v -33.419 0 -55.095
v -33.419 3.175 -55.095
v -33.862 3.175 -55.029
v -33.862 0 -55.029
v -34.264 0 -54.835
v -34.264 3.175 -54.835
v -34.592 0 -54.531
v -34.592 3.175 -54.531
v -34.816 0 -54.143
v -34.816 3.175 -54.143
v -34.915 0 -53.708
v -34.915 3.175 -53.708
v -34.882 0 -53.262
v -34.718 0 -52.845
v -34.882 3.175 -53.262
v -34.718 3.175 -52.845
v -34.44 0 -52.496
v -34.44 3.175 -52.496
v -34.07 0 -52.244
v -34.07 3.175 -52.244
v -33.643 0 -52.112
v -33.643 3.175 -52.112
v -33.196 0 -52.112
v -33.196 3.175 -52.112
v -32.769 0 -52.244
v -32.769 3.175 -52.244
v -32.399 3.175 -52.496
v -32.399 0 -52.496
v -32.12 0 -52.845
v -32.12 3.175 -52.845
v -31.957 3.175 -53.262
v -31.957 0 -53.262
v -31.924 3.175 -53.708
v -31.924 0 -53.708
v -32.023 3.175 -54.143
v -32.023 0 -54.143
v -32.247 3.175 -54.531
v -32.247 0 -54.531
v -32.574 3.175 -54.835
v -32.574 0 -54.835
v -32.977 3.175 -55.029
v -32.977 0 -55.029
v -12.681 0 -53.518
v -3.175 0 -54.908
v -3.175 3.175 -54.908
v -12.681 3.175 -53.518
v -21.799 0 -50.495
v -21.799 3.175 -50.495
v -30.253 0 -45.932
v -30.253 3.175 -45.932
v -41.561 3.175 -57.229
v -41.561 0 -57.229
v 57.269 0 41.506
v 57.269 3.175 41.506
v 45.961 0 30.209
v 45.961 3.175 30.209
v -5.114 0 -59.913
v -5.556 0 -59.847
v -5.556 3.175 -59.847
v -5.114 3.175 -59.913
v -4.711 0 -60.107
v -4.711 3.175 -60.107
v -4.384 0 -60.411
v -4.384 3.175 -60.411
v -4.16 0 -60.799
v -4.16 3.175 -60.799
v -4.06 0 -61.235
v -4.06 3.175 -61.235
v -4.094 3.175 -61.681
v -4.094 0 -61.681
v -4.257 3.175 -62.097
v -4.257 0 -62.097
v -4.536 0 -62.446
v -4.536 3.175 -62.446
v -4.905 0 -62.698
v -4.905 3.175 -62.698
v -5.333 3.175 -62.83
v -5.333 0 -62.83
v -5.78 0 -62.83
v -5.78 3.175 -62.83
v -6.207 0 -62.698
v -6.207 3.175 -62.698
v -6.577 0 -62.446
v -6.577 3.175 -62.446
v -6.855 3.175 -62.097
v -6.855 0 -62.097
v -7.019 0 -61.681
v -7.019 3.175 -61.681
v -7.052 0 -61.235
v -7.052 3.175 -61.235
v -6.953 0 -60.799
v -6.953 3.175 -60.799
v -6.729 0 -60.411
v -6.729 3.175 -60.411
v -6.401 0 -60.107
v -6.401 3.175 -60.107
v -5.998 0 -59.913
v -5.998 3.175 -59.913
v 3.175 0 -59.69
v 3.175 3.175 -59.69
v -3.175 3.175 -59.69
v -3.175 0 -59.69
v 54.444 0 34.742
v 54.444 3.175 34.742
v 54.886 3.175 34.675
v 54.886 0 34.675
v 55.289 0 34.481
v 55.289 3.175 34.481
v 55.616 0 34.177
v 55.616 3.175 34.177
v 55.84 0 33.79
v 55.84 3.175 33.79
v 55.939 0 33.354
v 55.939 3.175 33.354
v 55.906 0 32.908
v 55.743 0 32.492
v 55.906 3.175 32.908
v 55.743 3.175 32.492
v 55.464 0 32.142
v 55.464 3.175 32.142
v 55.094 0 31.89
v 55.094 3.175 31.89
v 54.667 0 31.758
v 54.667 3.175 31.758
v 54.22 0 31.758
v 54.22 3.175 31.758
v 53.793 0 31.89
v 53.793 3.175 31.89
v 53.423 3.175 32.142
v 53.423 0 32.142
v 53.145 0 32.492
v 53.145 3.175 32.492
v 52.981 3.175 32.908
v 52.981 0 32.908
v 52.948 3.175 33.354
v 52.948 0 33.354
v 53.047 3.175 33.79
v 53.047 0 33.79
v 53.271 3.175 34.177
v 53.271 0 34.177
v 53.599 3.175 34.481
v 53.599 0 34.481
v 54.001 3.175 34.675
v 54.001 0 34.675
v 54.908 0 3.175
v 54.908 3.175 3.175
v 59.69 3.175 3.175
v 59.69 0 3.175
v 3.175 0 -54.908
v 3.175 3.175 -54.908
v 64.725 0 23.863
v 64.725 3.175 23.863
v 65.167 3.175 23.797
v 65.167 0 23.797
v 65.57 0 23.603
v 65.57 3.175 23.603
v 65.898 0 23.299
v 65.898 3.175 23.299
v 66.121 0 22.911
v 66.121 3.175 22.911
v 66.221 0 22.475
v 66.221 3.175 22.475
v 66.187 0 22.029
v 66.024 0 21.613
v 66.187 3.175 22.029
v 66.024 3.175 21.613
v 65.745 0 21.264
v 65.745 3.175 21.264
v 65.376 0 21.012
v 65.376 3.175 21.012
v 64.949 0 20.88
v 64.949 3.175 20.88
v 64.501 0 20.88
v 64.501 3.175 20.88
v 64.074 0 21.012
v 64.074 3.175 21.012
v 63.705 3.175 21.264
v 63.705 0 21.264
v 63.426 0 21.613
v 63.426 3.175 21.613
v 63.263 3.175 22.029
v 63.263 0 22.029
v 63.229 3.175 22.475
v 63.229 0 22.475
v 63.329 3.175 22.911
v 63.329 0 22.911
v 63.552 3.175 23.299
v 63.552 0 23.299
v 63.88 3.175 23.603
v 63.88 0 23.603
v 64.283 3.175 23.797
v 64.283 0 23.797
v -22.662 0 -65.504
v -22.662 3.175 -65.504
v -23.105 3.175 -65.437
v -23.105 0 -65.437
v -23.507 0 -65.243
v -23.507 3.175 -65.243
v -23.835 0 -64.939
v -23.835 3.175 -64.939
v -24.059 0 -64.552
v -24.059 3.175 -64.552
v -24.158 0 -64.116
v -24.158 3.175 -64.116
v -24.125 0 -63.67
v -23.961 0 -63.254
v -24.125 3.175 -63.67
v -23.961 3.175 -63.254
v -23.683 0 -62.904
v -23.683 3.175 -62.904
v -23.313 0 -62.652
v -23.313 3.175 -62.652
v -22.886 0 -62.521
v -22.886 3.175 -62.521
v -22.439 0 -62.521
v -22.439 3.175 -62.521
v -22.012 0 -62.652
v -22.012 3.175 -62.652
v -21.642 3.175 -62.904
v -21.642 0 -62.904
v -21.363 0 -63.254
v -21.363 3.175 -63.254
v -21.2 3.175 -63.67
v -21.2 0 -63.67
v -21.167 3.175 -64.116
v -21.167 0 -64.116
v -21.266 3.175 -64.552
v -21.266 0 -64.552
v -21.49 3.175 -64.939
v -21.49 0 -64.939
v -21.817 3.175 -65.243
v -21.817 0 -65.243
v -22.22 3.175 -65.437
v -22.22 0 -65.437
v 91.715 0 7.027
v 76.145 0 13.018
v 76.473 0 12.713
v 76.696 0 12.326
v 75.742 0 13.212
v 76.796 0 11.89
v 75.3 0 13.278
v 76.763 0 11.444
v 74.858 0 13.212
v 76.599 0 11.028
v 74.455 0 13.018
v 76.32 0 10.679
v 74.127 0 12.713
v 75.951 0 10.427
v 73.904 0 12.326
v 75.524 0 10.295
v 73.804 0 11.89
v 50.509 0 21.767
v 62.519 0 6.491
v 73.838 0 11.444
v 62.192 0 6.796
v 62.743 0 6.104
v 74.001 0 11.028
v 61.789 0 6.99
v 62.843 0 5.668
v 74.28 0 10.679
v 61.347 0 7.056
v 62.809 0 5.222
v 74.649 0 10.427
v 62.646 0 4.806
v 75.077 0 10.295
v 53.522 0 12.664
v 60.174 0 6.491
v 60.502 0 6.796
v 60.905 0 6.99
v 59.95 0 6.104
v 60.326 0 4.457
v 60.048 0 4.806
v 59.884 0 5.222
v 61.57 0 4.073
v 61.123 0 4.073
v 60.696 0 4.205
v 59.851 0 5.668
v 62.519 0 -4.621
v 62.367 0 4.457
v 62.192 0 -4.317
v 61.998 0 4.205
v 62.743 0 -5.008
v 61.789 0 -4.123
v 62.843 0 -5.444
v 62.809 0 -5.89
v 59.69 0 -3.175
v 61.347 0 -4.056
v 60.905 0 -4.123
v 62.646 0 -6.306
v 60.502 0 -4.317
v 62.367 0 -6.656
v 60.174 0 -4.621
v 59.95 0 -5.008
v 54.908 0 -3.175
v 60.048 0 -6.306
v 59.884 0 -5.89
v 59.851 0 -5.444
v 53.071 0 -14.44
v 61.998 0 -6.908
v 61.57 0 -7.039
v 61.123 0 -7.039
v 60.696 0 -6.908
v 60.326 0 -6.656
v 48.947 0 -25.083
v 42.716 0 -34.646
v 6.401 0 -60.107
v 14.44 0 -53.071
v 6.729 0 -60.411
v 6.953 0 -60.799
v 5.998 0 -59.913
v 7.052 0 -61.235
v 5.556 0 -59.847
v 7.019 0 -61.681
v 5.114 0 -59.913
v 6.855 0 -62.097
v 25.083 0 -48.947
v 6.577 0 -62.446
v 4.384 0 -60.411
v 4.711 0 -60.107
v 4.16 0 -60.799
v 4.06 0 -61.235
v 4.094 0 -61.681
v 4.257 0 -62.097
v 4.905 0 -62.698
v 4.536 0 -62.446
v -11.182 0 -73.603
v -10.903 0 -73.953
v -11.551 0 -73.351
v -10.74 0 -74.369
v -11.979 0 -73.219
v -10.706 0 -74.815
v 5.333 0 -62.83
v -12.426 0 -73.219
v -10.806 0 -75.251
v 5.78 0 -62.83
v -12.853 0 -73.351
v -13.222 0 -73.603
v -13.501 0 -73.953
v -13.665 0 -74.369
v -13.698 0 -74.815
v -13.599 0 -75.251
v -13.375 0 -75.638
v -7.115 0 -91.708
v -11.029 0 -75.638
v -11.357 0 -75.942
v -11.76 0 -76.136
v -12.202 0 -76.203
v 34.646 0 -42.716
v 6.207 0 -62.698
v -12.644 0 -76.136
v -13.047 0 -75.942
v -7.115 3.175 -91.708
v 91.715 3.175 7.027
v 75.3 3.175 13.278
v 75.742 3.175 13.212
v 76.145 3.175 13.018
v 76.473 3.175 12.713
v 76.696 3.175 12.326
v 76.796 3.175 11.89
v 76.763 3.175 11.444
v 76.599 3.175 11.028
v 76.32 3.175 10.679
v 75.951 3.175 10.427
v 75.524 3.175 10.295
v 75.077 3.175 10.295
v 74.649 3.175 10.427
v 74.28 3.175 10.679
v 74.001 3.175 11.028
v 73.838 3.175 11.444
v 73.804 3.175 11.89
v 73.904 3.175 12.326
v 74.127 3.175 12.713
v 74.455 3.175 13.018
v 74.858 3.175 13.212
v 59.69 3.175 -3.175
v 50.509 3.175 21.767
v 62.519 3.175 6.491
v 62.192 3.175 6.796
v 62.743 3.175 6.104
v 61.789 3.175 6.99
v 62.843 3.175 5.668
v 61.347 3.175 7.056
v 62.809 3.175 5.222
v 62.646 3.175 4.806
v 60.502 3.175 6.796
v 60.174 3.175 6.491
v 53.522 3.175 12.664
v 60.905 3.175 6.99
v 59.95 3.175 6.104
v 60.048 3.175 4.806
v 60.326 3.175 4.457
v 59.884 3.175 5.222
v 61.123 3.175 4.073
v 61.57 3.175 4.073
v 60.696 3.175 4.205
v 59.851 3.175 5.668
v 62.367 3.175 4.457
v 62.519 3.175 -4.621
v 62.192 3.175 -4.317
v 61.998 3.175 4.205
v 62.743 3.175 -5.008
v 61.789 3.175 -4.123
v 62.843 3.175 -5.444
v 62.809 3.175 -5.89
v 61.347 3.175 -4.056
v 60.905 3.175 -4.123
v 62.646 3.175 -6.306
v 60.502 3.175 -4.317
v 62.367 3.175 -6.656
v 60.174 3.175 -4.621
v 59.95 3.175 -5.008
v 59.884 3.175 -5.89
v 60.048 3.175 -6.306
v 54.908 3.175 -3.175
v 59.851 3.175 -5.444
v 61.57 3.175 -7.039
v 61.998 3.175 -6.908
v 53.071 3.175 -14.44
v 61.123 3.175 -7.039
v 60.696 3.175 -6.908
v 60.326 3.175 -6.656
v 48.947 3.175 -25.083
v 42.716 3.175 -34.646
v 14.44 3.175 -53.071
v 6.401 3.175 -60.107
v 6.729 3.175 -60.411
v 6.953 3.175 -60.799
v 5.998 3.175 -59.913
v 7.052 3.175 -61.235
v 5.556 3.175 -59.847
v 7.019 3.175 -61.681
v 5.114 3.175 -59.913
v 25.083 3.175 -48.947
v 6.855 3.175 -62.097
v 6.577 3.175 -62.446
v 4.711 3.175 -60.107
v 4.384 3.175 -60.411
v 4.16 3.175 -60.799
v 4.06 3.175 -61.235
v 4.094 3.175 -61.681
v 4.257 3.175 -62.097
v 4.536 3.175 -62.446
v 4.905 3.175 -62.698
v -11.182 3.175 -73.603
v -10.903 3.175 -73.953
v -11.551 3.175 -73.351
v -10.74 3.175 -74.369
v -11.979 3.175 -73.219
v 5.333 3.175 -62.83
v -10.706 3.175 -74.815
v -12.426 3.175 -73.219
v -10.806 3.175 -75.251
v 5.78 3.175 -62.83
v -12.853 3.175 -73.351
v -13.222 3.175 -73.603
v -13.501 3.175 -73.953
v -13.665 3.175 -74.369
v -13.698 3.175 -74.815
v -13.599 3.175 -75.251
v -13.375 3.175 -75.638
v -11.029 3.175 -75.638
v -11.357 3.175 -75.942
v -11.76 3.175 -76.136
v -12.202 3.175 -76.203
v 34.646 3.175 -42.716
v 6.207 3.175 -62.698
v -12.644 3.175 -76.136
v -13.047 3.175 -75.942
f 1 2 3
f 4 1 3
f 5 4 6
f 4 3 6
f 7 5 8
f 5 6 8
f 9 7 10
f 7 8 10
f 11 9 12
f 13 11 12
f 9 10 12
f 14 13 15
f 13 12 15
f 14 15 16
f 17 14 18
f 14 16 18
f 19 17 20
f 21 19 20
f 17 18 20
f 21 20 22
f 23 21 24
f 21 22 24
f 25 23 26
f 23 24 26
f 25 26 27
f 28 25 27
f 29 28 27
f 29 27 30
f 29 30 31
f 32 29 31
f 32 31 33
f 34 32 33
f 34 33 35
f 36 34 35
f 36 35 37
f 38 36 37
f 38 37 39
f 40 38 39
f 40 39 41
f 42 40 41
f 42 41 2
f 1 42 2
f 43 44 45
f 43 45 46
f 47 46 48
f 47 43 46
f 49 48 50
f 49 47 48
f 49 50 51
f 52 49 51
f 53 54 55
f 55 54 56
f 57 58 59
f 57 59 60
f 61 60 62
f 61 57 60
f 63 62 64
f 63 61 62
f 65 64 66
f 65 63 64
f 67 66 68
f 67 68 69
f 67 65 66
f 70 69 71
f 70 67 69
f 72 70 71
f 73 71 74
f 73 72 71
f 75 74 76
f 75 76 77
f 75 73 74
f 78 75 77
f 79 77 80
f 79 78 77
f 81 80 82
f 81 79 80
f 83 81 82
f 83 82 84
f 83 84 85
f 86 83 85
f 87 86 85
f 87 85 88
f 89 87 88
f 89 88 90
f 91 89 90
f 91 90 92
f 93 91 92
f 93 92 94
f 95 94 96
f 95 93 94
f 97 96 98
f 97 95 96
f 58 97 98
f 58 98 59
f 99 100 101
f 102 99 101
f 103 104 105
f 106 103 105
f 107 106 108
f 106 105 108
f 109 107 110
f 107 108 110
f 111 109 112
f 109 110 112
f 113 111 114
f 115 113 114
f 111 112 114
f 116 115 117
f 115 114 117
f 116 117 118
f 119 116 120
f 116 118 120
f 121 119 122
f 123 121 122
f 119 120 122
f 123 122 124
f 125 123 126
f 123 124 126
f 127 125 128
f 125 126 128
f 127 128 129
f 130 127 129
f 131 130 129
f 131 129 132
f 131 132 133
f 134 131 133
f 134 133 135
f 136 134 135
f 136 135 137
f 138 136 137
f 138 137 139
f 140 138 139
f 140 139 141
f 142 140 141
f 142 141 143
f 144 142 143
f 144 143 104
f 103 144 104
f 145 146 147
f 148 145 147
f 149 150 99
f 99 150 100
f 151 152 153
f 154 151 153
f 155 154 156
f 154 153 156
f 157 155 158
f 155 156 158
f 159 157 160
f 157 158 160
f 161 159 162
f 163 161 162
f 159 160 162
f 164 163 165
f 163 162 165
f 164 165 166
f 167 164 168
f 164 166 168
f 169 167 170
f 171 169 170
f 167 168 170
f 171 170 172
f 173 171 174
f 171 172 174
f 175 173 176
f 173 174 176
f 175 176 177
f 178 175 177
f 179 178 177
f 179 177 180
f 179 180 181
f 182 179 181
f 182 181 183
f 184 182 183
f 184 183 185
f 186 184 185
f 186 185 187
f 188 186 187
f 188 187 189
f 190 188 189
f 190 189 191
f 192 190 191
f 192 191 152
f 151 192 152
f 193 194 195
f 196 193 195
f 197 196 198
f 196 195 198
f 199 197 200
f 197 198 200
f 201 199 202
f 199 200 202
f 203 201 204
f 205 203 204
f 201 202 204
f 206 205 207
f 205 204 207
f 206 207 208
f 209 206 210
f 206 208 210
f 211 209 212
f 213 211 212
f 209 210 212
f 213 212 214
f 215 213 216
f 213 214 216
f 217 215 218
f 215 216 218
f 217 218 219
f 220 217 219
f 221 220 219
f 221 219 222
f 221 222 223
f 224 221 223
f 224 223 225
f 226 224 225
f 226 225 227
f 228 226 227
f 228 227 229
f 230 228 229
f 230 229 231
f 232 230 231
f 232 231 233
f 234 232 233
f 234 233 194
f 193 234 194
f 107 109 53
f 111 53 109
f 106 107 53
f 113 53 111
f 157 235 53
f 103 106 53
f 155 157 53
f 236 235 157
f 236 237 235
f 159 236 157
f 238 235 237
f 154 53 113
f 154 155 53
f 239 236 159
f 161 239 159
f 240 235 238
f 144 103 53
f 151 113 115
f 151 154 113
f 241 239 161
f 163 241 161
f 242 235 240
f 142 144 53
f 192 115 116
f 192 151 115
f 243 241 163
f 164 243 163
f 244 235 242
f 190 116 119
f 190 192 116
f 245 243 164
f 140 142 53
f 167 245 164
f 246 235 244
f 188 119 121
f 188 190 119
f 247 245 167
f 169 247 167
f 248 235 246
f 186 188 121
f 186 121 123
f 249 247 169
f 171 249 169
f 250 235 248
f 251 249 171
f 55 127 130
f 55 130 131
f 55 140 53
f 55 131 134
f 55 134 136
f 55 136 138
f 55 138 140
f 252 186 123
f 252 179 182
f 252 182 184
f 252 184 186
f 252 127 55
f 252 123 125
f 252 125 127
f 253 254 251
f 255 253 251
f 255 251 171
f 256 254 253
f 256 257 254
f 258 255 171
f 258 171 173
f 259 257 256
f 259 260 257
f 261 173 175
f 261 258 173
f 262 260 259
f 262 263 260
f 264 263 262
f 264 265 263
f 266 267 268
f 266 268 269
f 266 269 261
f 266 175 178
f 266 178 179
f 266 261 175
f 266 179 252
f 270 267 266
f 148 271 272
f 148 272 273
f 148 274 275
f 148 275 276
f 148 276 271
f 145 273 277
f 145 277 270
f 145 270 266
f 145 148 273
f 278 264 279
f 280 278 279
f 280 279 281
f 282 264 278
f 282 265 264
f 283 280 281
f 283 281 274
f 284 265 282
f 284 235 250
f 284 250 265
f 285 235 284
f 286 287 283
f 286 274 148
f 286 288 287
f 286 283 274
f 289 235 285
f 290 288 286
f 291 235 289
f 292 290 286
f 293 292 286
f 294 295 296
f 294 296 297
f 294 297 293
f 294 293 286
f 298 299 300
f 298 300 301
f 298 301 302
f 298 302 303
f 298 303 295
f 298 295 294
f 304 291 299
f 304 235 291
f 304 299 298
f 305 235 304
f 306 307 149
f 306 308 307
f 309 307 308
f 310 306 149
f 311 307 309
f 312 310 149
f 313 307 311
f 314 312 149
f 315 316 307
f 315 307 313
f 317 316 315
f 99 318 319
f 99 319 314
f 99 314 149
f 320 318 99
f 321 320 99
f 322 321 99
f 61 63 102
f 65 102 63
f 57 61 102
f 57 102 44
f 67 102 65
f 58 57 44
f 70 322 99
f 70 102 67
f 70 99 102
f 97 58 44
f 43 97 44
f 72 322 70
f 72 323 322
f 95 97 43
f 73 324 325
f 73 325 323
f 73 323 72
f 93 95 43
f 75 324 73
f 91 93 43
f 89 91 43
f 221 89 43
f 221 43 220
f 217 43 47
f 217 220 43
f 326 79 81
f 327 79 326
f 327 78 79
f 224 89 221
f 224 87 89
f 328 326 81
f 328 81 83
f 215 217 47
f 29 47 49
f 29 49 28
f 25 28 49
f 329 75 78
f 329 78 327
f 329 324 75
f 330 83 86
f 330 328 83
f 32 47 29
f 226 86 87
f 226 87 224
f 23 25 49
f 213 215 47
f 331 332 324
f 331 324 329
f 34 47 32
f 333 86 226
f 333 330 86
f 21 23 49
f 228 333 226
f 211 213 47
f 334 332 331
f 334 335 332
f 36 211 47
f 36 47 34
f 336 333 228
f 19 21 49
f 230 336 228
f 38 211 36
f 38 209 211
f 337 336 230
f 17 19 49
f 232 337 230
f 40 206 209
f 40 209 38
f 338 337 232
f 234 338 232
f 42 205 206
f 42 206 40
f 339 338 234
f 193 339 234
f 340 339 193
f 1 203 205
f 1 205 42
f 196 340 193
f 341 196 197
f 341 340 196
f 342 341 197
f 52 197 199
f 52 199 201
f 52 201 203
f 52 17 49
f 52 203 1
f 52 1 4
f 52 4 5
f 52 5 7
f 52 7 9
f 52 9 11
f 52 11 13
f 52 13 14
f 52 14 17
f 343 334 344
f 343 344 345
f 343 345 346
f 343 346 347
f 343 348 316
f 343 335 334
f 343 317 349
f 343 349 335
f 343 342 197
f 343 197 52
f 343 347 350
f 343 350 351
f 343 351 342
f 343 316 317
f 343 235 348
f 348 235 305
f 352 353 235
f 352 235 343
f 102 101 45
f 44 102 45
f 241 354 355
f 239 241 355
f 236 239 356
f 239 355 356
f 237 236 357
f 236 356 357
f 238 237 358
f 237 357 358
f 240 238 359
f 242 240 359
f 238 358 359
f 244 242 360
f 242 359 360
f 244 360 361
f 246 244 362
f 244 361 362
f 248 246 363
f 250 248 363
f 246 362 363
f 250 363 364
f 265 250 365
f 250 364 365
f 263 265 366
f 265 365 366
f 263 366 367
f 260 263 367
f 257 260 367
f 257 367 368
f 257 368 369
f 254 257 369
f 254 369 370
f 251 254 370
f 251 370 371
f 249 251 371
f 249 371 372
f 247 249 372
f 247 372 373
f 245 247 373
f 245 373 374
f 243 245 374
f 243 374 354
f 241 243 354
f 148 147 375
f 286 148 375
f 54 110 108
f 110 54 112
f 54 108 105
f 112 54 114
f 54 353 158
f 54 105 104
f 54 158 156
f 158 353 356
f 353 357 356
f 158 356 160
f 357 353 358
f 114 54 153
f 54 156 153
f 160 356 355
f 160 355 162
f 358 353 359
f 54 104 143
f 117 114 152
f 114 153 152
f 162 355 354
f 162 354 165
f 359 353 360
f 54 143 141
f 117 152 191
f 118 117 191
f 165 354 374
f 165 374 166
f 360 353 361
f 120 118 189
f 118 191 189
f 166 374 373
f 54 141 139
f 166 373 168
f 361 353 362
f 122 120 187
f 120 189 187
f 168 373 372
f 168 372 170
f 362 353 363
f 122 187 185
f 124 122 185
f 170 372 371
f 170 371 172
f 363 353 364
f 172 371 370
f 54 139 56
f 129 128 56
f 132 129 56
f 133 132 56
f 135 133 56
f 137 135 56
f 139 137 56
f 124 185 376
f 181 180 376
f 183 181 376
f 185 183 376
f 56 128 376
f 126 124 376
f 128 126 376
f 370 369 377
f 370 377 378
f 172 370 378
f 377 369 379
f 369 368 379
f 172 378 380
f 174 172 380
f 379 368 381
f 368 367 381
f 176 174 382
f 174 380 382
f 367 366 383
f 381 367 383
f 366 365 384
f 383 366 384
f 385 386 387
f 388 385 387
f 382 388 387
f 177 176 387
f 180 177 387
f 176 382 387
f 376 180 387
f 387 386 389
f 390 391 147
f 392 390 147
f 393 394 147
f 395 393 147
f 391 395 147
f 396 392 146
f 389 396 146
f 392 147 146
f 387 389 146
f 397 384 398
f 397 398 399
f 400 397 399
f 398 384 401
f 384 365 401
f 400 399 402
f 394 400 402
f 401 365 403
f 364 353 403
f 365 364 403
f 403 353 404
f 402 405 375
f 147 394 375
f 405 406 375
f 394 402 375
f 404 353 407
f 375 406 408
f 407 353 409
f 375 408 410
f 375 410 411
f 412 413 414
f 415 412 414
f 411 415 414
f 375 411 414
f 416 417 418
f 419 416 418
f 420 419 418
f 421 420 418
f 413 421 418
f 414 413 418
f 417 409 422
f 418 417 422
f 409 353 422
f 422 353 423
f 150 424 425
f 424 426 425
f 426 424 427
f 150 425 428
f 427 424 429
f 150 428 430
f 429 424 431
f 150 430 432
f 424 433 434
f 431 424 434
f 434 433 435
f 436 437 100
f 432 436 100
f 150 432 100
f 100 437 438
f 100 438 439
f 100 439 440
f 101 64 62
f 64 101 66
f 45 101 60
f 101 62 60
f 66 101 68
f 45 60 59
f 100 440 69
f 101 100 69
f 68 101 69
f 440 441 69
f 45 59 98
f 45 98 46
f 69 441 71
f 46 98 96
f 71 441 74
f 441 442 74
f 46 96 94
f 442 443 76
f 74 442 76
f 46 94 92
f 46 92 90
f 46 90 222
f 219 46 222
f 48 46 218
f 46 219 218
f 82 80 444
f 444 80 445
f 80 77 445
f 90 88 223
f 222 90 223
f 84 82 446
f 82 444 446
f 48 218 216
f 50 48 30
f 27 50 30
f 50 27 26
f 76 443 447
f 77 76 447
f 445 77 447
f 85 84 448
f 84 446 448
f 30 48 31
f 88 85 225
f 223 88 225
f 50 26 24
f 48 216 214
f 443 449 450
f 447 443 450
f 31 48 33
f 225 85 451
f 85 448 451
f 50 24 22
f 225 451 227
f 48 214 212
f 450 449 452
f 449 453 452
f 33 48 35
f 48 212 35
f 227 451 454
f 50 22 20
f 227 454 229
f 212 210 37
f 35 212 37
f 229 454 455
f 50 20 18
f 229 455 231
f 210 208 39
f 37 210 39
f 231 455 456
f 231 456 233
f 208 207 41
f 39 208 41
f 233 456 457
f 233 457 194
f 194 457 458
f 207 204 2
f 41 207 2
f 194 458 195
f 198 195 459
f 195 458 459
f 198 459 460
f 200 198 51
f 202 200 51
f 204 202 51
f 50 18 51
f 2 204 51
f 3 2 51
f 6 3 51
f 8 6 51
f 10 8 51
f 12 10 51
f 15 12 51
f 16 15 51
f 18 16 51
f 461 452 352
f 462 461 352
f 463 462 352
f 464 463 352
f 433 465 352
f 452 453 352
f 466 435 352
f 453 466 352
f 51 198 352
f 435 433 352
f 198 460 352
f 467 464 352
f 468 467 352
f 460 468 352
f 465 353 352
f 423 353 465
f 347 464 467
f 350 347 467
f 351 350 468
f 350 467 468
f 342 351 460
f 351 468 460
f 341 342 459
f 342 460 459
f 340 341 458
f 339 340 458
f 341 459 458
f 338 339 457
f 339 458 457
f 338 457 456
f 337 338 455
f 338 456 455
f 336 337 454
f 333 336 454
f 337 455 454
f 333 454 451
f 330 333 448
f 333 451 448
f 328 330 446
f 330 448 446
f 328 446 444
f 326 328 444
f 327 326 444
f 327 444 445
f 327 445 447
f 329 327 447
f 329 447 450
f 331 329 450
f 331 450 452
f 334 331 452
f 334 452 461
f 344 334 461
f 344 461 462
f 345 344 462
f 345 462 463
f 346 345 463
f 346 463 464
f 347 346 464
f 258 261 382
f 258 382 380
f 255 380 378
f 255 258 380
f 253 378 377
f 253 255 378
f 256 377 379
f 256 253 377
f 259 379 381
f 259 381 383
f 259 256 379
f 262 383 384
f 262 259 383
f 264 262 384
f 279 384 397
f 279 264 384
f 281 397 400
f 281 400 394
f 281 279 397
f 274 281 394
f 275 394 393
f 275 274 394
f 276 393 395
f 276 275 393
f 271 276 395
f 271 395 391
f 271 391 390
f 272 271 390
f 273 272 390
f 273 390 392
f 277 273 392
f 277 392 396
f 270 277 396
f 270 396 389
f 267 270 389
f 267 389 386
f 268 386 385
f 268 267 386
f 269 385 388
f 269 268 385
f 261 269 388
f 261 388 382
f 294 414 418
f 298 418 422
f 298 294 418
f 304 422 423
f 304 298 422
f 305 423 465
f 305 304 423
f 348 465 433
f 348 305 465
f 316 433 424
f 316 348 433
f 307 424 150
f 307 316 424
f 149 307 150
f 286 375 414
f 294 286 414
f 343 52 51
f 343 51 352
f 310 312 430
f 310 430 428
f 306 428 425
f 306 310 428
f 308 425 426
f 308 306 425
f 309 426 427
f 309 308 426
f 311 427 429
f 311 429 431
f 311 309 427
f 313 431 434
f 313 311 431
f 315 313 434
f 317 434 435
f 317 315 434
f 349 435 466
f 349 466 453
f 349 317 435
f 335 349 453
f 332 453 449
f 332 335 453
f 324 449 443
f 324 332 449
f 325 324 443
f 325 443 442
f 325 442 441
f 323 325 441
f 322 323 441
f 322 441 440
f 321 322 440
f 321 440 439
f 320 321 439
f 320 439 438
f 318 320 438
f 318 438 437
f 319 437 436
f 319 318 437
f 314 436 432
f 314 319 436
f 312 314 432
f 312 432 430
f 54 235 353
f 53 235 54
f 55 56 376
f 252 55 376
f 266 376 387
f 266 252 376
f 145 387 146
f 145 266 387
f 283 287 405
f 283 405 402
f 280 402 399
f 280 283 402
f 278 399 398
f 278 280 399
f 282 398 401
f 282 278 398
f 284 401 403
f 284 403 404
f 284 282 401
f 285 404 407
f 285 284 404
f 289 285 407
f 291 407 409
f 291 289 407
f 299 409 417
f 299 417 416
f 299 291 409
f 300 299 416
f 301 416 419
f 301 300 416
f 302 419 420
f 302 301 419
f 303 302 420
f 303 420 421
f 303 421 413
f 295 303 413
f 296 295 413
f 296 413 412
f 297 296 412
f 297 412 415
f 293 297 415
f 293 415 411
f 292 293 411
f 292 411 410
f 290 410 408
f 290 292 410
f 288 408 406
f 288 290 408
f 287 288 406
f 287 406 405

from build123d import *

# Parameters (mm, degrees)
SKETCH1_R           = 1.5
SKETCH1_R_2         = 55
BOSS_EXTRUDE1_DEPTH = 3.175
CUT_EXTRUDE3_DEPTH  = 140.736059076
CUT_EXTRUDE4_DEPTH  = 140.736059076
CUT_EXTRUDE5_DEPTH  = 140.736059076
SKETCH6_R           = 1.5
CUT_EXTRUDE6_DEPTH  = 130.738840902
CUT_EXTRUDE7_DEPTH  = 10


with BuildPart() as part:
    # Sketch1 → Boss-Extrude1 (new body)
    with BuildSketch(Plane(origin=(0, 0, 0), x_dir=(1, 0, 0), z_dir=(0, 1, 0))):
        Polygon((0.047005036, -98.782806148), (-98.782806148, -0.047005036), (-0.047005036, 98.782806148), (98.782806148, 0.047005036), align=None)
        with Locations(Location((-61.346730494, 5.55625, 0), (0, 0, 270))):
            Circle(SKETCH1_R, mode=Mode.SUBTRACT)
        with Locations(Location((-61.346730494, -5.55625, 0), (0, 0, 270))):
            Circle(SKETCH1_R, mode=Mode.SUBTRACT)
        with Locations(Location((-5.55625, -61.346730494, 0), (0, 0, 270))):
            Circle(SKETCH1_R, mode=Mode.SUBTRACT)
        with Locations(Location((5.55625, -61.346730494, 0), (0, 0, 270))):
            Circle(SKETCH1_R, mode=Mode.SUBTRACT)
        with Locations(Location((61.346730494, -5.55625, 0), (0, 0, 270))):
            Circle(SKETCH1_R, mode=Mode.SUBTRACT)
        with Locations(Location((61.346730494, 5.55625, 0), (0, 0, 270))):
            Circle(SKETCH1_R, mode=Mode.SUBTRACT)
        with Locations(Location((5.55625, 61.346730494, 0), (0, 0, 270))):
            Circle(SKETCH1_R, mode=Mode.SUBTRACT)
        with Locations(Location((-5.55625, 61.346730494, 0), (0, 0, 270))):
            Circle(SKETCH1_R, mode=Mode.SUBTRACT)
        with Locations(Location((0, 0, 0), (0, 0, 270))):
            Circle(SKETCH1_R_2, mode=Mode.SUBTRACT)
    extrude(amount=BOSS_EXTRUDE1_DEPTH)

    # Sketch2 → Cut-Extrude3 (cut, through all)
    with BuildSketch(Plane(origin=(0, 3.175, 0), x_dir=(1, 0, 0), z_dir=(0, 1, 0))):
        Polygon((3.175, 53.34), (3.175, 59.69), (-3.175, 59.69), (-3.175, 53.34), (-3.175, 52.244537665), (3.175, 52.244537665), align=None)
        Polygon((53.34, -3.175), (59.69, -3.175), (59.69, 3.175), (53.34, 3.175), (52.244537665, 3.175), (52.244537665, -3.175), align=None)
        Polygon((-3.175, -53.34), (-3.175, -59.69), (3.175, -59.69), (3.175, -53.34), (3.175, -52.244537665), (-3.175, -52.244537665), align=None)
        Polygon((-53.34, 3.175), (-59.69, 3.175), (-59.69, -3.175), (-53.34, -3.175), (-52.244537665, -3.175), (-52.244537665, 3.175), align=None)
    extrude(amount=-CUT_EXTRUDE3_DEPTH, mode=Mode.SUBTRACT)

    # Sketch3 → Cut-Extrude4 (cut, through all)
    with BuildSketch(Plane(origin=(0, 3.175, 0), x_dir=(1, 0, 0), z_dir=(0, 1, 0))):
        Polygon((-49.414905592, 49.367900556), (49.414905592, -49.367900556), (0.047005036, -98.782806148), (-98.782806148, -0.047005036), align=None)
    extrude(amount=-CUT_EXTRUDE4_DEPTH, mode=Mode.SUBTRACT)

    # Sketch5 → Cut-Extrude5 (cut, through all)
    with BuildSketch(Plane(origin=(0, 3.175, 0), x_dir=(1, 0, 0), z_dir=(0, 1, 0))):
        Polygon((98.782806148, 0.047005036), (91.71510385, -7.027426688), (-7.114707335, 91.708374424), (-0.047005036, 98.782806148), align=None)
    extrude(amount=-CUT_EXTRUDE5_DEPTH, mode=Mode.SUBTRACT)

    # Sketch6 → Cut-Extrude6 (cut, through all)
    with BuildSketch(Plane(origin=(0, 3.175, 0), x_dir=(1, 0, 0), z_dir=(0, 1, 0))):
        with Locations(Location((64.725061333, -22.363275374, 0), (0, 0, 270))):
            Circle(SKETCH6_R)
        with Locations(Location((75.300110897, -11.778156907, 0), (0, 0, 270))):
            Circle(SKETCH6_R)
        with Locations(Location((-12.20223816, 74.702563661, 0), (0, 0, 90))):
            Circle(SKETCH6_R)
        with Locations(Location((-22.662437607, 64.003936002, 0), (0, 0, 90))):
            Circle(SKETCH6_R)
        with Locations(Location((54.443600685, -33.241703487, 0), (0, 0, 270))):
            Circle(SKETCH6_R)
        with Locations(Location((-33.419374261, 53.595432504, 0), (0, 0, 90))):
            Circle(SKETCH6_R)
    extrude(amount=-CUT_EXTRUDE6_DEPTH, mode=Mode.SUBTRACT)

    # Sketch7 → Cut-Extrude7 (cut)
    with BuildSketch(Plane(origin=(0, 3.175, 0), x_dir=(1, 0, 0), z_dir=(0, 1, 0))):
        Polygon((49.414905592, -49.367900556), (57.268889772, -41.506438303), (-41.560921413, 57.229362809), (-49.414905592, 49.367900556), align=None)
    extrude(amount=-CUT_EXTRUDE7_DEPTH, mode=Mode.SUBTRACT)


solid = part.part
